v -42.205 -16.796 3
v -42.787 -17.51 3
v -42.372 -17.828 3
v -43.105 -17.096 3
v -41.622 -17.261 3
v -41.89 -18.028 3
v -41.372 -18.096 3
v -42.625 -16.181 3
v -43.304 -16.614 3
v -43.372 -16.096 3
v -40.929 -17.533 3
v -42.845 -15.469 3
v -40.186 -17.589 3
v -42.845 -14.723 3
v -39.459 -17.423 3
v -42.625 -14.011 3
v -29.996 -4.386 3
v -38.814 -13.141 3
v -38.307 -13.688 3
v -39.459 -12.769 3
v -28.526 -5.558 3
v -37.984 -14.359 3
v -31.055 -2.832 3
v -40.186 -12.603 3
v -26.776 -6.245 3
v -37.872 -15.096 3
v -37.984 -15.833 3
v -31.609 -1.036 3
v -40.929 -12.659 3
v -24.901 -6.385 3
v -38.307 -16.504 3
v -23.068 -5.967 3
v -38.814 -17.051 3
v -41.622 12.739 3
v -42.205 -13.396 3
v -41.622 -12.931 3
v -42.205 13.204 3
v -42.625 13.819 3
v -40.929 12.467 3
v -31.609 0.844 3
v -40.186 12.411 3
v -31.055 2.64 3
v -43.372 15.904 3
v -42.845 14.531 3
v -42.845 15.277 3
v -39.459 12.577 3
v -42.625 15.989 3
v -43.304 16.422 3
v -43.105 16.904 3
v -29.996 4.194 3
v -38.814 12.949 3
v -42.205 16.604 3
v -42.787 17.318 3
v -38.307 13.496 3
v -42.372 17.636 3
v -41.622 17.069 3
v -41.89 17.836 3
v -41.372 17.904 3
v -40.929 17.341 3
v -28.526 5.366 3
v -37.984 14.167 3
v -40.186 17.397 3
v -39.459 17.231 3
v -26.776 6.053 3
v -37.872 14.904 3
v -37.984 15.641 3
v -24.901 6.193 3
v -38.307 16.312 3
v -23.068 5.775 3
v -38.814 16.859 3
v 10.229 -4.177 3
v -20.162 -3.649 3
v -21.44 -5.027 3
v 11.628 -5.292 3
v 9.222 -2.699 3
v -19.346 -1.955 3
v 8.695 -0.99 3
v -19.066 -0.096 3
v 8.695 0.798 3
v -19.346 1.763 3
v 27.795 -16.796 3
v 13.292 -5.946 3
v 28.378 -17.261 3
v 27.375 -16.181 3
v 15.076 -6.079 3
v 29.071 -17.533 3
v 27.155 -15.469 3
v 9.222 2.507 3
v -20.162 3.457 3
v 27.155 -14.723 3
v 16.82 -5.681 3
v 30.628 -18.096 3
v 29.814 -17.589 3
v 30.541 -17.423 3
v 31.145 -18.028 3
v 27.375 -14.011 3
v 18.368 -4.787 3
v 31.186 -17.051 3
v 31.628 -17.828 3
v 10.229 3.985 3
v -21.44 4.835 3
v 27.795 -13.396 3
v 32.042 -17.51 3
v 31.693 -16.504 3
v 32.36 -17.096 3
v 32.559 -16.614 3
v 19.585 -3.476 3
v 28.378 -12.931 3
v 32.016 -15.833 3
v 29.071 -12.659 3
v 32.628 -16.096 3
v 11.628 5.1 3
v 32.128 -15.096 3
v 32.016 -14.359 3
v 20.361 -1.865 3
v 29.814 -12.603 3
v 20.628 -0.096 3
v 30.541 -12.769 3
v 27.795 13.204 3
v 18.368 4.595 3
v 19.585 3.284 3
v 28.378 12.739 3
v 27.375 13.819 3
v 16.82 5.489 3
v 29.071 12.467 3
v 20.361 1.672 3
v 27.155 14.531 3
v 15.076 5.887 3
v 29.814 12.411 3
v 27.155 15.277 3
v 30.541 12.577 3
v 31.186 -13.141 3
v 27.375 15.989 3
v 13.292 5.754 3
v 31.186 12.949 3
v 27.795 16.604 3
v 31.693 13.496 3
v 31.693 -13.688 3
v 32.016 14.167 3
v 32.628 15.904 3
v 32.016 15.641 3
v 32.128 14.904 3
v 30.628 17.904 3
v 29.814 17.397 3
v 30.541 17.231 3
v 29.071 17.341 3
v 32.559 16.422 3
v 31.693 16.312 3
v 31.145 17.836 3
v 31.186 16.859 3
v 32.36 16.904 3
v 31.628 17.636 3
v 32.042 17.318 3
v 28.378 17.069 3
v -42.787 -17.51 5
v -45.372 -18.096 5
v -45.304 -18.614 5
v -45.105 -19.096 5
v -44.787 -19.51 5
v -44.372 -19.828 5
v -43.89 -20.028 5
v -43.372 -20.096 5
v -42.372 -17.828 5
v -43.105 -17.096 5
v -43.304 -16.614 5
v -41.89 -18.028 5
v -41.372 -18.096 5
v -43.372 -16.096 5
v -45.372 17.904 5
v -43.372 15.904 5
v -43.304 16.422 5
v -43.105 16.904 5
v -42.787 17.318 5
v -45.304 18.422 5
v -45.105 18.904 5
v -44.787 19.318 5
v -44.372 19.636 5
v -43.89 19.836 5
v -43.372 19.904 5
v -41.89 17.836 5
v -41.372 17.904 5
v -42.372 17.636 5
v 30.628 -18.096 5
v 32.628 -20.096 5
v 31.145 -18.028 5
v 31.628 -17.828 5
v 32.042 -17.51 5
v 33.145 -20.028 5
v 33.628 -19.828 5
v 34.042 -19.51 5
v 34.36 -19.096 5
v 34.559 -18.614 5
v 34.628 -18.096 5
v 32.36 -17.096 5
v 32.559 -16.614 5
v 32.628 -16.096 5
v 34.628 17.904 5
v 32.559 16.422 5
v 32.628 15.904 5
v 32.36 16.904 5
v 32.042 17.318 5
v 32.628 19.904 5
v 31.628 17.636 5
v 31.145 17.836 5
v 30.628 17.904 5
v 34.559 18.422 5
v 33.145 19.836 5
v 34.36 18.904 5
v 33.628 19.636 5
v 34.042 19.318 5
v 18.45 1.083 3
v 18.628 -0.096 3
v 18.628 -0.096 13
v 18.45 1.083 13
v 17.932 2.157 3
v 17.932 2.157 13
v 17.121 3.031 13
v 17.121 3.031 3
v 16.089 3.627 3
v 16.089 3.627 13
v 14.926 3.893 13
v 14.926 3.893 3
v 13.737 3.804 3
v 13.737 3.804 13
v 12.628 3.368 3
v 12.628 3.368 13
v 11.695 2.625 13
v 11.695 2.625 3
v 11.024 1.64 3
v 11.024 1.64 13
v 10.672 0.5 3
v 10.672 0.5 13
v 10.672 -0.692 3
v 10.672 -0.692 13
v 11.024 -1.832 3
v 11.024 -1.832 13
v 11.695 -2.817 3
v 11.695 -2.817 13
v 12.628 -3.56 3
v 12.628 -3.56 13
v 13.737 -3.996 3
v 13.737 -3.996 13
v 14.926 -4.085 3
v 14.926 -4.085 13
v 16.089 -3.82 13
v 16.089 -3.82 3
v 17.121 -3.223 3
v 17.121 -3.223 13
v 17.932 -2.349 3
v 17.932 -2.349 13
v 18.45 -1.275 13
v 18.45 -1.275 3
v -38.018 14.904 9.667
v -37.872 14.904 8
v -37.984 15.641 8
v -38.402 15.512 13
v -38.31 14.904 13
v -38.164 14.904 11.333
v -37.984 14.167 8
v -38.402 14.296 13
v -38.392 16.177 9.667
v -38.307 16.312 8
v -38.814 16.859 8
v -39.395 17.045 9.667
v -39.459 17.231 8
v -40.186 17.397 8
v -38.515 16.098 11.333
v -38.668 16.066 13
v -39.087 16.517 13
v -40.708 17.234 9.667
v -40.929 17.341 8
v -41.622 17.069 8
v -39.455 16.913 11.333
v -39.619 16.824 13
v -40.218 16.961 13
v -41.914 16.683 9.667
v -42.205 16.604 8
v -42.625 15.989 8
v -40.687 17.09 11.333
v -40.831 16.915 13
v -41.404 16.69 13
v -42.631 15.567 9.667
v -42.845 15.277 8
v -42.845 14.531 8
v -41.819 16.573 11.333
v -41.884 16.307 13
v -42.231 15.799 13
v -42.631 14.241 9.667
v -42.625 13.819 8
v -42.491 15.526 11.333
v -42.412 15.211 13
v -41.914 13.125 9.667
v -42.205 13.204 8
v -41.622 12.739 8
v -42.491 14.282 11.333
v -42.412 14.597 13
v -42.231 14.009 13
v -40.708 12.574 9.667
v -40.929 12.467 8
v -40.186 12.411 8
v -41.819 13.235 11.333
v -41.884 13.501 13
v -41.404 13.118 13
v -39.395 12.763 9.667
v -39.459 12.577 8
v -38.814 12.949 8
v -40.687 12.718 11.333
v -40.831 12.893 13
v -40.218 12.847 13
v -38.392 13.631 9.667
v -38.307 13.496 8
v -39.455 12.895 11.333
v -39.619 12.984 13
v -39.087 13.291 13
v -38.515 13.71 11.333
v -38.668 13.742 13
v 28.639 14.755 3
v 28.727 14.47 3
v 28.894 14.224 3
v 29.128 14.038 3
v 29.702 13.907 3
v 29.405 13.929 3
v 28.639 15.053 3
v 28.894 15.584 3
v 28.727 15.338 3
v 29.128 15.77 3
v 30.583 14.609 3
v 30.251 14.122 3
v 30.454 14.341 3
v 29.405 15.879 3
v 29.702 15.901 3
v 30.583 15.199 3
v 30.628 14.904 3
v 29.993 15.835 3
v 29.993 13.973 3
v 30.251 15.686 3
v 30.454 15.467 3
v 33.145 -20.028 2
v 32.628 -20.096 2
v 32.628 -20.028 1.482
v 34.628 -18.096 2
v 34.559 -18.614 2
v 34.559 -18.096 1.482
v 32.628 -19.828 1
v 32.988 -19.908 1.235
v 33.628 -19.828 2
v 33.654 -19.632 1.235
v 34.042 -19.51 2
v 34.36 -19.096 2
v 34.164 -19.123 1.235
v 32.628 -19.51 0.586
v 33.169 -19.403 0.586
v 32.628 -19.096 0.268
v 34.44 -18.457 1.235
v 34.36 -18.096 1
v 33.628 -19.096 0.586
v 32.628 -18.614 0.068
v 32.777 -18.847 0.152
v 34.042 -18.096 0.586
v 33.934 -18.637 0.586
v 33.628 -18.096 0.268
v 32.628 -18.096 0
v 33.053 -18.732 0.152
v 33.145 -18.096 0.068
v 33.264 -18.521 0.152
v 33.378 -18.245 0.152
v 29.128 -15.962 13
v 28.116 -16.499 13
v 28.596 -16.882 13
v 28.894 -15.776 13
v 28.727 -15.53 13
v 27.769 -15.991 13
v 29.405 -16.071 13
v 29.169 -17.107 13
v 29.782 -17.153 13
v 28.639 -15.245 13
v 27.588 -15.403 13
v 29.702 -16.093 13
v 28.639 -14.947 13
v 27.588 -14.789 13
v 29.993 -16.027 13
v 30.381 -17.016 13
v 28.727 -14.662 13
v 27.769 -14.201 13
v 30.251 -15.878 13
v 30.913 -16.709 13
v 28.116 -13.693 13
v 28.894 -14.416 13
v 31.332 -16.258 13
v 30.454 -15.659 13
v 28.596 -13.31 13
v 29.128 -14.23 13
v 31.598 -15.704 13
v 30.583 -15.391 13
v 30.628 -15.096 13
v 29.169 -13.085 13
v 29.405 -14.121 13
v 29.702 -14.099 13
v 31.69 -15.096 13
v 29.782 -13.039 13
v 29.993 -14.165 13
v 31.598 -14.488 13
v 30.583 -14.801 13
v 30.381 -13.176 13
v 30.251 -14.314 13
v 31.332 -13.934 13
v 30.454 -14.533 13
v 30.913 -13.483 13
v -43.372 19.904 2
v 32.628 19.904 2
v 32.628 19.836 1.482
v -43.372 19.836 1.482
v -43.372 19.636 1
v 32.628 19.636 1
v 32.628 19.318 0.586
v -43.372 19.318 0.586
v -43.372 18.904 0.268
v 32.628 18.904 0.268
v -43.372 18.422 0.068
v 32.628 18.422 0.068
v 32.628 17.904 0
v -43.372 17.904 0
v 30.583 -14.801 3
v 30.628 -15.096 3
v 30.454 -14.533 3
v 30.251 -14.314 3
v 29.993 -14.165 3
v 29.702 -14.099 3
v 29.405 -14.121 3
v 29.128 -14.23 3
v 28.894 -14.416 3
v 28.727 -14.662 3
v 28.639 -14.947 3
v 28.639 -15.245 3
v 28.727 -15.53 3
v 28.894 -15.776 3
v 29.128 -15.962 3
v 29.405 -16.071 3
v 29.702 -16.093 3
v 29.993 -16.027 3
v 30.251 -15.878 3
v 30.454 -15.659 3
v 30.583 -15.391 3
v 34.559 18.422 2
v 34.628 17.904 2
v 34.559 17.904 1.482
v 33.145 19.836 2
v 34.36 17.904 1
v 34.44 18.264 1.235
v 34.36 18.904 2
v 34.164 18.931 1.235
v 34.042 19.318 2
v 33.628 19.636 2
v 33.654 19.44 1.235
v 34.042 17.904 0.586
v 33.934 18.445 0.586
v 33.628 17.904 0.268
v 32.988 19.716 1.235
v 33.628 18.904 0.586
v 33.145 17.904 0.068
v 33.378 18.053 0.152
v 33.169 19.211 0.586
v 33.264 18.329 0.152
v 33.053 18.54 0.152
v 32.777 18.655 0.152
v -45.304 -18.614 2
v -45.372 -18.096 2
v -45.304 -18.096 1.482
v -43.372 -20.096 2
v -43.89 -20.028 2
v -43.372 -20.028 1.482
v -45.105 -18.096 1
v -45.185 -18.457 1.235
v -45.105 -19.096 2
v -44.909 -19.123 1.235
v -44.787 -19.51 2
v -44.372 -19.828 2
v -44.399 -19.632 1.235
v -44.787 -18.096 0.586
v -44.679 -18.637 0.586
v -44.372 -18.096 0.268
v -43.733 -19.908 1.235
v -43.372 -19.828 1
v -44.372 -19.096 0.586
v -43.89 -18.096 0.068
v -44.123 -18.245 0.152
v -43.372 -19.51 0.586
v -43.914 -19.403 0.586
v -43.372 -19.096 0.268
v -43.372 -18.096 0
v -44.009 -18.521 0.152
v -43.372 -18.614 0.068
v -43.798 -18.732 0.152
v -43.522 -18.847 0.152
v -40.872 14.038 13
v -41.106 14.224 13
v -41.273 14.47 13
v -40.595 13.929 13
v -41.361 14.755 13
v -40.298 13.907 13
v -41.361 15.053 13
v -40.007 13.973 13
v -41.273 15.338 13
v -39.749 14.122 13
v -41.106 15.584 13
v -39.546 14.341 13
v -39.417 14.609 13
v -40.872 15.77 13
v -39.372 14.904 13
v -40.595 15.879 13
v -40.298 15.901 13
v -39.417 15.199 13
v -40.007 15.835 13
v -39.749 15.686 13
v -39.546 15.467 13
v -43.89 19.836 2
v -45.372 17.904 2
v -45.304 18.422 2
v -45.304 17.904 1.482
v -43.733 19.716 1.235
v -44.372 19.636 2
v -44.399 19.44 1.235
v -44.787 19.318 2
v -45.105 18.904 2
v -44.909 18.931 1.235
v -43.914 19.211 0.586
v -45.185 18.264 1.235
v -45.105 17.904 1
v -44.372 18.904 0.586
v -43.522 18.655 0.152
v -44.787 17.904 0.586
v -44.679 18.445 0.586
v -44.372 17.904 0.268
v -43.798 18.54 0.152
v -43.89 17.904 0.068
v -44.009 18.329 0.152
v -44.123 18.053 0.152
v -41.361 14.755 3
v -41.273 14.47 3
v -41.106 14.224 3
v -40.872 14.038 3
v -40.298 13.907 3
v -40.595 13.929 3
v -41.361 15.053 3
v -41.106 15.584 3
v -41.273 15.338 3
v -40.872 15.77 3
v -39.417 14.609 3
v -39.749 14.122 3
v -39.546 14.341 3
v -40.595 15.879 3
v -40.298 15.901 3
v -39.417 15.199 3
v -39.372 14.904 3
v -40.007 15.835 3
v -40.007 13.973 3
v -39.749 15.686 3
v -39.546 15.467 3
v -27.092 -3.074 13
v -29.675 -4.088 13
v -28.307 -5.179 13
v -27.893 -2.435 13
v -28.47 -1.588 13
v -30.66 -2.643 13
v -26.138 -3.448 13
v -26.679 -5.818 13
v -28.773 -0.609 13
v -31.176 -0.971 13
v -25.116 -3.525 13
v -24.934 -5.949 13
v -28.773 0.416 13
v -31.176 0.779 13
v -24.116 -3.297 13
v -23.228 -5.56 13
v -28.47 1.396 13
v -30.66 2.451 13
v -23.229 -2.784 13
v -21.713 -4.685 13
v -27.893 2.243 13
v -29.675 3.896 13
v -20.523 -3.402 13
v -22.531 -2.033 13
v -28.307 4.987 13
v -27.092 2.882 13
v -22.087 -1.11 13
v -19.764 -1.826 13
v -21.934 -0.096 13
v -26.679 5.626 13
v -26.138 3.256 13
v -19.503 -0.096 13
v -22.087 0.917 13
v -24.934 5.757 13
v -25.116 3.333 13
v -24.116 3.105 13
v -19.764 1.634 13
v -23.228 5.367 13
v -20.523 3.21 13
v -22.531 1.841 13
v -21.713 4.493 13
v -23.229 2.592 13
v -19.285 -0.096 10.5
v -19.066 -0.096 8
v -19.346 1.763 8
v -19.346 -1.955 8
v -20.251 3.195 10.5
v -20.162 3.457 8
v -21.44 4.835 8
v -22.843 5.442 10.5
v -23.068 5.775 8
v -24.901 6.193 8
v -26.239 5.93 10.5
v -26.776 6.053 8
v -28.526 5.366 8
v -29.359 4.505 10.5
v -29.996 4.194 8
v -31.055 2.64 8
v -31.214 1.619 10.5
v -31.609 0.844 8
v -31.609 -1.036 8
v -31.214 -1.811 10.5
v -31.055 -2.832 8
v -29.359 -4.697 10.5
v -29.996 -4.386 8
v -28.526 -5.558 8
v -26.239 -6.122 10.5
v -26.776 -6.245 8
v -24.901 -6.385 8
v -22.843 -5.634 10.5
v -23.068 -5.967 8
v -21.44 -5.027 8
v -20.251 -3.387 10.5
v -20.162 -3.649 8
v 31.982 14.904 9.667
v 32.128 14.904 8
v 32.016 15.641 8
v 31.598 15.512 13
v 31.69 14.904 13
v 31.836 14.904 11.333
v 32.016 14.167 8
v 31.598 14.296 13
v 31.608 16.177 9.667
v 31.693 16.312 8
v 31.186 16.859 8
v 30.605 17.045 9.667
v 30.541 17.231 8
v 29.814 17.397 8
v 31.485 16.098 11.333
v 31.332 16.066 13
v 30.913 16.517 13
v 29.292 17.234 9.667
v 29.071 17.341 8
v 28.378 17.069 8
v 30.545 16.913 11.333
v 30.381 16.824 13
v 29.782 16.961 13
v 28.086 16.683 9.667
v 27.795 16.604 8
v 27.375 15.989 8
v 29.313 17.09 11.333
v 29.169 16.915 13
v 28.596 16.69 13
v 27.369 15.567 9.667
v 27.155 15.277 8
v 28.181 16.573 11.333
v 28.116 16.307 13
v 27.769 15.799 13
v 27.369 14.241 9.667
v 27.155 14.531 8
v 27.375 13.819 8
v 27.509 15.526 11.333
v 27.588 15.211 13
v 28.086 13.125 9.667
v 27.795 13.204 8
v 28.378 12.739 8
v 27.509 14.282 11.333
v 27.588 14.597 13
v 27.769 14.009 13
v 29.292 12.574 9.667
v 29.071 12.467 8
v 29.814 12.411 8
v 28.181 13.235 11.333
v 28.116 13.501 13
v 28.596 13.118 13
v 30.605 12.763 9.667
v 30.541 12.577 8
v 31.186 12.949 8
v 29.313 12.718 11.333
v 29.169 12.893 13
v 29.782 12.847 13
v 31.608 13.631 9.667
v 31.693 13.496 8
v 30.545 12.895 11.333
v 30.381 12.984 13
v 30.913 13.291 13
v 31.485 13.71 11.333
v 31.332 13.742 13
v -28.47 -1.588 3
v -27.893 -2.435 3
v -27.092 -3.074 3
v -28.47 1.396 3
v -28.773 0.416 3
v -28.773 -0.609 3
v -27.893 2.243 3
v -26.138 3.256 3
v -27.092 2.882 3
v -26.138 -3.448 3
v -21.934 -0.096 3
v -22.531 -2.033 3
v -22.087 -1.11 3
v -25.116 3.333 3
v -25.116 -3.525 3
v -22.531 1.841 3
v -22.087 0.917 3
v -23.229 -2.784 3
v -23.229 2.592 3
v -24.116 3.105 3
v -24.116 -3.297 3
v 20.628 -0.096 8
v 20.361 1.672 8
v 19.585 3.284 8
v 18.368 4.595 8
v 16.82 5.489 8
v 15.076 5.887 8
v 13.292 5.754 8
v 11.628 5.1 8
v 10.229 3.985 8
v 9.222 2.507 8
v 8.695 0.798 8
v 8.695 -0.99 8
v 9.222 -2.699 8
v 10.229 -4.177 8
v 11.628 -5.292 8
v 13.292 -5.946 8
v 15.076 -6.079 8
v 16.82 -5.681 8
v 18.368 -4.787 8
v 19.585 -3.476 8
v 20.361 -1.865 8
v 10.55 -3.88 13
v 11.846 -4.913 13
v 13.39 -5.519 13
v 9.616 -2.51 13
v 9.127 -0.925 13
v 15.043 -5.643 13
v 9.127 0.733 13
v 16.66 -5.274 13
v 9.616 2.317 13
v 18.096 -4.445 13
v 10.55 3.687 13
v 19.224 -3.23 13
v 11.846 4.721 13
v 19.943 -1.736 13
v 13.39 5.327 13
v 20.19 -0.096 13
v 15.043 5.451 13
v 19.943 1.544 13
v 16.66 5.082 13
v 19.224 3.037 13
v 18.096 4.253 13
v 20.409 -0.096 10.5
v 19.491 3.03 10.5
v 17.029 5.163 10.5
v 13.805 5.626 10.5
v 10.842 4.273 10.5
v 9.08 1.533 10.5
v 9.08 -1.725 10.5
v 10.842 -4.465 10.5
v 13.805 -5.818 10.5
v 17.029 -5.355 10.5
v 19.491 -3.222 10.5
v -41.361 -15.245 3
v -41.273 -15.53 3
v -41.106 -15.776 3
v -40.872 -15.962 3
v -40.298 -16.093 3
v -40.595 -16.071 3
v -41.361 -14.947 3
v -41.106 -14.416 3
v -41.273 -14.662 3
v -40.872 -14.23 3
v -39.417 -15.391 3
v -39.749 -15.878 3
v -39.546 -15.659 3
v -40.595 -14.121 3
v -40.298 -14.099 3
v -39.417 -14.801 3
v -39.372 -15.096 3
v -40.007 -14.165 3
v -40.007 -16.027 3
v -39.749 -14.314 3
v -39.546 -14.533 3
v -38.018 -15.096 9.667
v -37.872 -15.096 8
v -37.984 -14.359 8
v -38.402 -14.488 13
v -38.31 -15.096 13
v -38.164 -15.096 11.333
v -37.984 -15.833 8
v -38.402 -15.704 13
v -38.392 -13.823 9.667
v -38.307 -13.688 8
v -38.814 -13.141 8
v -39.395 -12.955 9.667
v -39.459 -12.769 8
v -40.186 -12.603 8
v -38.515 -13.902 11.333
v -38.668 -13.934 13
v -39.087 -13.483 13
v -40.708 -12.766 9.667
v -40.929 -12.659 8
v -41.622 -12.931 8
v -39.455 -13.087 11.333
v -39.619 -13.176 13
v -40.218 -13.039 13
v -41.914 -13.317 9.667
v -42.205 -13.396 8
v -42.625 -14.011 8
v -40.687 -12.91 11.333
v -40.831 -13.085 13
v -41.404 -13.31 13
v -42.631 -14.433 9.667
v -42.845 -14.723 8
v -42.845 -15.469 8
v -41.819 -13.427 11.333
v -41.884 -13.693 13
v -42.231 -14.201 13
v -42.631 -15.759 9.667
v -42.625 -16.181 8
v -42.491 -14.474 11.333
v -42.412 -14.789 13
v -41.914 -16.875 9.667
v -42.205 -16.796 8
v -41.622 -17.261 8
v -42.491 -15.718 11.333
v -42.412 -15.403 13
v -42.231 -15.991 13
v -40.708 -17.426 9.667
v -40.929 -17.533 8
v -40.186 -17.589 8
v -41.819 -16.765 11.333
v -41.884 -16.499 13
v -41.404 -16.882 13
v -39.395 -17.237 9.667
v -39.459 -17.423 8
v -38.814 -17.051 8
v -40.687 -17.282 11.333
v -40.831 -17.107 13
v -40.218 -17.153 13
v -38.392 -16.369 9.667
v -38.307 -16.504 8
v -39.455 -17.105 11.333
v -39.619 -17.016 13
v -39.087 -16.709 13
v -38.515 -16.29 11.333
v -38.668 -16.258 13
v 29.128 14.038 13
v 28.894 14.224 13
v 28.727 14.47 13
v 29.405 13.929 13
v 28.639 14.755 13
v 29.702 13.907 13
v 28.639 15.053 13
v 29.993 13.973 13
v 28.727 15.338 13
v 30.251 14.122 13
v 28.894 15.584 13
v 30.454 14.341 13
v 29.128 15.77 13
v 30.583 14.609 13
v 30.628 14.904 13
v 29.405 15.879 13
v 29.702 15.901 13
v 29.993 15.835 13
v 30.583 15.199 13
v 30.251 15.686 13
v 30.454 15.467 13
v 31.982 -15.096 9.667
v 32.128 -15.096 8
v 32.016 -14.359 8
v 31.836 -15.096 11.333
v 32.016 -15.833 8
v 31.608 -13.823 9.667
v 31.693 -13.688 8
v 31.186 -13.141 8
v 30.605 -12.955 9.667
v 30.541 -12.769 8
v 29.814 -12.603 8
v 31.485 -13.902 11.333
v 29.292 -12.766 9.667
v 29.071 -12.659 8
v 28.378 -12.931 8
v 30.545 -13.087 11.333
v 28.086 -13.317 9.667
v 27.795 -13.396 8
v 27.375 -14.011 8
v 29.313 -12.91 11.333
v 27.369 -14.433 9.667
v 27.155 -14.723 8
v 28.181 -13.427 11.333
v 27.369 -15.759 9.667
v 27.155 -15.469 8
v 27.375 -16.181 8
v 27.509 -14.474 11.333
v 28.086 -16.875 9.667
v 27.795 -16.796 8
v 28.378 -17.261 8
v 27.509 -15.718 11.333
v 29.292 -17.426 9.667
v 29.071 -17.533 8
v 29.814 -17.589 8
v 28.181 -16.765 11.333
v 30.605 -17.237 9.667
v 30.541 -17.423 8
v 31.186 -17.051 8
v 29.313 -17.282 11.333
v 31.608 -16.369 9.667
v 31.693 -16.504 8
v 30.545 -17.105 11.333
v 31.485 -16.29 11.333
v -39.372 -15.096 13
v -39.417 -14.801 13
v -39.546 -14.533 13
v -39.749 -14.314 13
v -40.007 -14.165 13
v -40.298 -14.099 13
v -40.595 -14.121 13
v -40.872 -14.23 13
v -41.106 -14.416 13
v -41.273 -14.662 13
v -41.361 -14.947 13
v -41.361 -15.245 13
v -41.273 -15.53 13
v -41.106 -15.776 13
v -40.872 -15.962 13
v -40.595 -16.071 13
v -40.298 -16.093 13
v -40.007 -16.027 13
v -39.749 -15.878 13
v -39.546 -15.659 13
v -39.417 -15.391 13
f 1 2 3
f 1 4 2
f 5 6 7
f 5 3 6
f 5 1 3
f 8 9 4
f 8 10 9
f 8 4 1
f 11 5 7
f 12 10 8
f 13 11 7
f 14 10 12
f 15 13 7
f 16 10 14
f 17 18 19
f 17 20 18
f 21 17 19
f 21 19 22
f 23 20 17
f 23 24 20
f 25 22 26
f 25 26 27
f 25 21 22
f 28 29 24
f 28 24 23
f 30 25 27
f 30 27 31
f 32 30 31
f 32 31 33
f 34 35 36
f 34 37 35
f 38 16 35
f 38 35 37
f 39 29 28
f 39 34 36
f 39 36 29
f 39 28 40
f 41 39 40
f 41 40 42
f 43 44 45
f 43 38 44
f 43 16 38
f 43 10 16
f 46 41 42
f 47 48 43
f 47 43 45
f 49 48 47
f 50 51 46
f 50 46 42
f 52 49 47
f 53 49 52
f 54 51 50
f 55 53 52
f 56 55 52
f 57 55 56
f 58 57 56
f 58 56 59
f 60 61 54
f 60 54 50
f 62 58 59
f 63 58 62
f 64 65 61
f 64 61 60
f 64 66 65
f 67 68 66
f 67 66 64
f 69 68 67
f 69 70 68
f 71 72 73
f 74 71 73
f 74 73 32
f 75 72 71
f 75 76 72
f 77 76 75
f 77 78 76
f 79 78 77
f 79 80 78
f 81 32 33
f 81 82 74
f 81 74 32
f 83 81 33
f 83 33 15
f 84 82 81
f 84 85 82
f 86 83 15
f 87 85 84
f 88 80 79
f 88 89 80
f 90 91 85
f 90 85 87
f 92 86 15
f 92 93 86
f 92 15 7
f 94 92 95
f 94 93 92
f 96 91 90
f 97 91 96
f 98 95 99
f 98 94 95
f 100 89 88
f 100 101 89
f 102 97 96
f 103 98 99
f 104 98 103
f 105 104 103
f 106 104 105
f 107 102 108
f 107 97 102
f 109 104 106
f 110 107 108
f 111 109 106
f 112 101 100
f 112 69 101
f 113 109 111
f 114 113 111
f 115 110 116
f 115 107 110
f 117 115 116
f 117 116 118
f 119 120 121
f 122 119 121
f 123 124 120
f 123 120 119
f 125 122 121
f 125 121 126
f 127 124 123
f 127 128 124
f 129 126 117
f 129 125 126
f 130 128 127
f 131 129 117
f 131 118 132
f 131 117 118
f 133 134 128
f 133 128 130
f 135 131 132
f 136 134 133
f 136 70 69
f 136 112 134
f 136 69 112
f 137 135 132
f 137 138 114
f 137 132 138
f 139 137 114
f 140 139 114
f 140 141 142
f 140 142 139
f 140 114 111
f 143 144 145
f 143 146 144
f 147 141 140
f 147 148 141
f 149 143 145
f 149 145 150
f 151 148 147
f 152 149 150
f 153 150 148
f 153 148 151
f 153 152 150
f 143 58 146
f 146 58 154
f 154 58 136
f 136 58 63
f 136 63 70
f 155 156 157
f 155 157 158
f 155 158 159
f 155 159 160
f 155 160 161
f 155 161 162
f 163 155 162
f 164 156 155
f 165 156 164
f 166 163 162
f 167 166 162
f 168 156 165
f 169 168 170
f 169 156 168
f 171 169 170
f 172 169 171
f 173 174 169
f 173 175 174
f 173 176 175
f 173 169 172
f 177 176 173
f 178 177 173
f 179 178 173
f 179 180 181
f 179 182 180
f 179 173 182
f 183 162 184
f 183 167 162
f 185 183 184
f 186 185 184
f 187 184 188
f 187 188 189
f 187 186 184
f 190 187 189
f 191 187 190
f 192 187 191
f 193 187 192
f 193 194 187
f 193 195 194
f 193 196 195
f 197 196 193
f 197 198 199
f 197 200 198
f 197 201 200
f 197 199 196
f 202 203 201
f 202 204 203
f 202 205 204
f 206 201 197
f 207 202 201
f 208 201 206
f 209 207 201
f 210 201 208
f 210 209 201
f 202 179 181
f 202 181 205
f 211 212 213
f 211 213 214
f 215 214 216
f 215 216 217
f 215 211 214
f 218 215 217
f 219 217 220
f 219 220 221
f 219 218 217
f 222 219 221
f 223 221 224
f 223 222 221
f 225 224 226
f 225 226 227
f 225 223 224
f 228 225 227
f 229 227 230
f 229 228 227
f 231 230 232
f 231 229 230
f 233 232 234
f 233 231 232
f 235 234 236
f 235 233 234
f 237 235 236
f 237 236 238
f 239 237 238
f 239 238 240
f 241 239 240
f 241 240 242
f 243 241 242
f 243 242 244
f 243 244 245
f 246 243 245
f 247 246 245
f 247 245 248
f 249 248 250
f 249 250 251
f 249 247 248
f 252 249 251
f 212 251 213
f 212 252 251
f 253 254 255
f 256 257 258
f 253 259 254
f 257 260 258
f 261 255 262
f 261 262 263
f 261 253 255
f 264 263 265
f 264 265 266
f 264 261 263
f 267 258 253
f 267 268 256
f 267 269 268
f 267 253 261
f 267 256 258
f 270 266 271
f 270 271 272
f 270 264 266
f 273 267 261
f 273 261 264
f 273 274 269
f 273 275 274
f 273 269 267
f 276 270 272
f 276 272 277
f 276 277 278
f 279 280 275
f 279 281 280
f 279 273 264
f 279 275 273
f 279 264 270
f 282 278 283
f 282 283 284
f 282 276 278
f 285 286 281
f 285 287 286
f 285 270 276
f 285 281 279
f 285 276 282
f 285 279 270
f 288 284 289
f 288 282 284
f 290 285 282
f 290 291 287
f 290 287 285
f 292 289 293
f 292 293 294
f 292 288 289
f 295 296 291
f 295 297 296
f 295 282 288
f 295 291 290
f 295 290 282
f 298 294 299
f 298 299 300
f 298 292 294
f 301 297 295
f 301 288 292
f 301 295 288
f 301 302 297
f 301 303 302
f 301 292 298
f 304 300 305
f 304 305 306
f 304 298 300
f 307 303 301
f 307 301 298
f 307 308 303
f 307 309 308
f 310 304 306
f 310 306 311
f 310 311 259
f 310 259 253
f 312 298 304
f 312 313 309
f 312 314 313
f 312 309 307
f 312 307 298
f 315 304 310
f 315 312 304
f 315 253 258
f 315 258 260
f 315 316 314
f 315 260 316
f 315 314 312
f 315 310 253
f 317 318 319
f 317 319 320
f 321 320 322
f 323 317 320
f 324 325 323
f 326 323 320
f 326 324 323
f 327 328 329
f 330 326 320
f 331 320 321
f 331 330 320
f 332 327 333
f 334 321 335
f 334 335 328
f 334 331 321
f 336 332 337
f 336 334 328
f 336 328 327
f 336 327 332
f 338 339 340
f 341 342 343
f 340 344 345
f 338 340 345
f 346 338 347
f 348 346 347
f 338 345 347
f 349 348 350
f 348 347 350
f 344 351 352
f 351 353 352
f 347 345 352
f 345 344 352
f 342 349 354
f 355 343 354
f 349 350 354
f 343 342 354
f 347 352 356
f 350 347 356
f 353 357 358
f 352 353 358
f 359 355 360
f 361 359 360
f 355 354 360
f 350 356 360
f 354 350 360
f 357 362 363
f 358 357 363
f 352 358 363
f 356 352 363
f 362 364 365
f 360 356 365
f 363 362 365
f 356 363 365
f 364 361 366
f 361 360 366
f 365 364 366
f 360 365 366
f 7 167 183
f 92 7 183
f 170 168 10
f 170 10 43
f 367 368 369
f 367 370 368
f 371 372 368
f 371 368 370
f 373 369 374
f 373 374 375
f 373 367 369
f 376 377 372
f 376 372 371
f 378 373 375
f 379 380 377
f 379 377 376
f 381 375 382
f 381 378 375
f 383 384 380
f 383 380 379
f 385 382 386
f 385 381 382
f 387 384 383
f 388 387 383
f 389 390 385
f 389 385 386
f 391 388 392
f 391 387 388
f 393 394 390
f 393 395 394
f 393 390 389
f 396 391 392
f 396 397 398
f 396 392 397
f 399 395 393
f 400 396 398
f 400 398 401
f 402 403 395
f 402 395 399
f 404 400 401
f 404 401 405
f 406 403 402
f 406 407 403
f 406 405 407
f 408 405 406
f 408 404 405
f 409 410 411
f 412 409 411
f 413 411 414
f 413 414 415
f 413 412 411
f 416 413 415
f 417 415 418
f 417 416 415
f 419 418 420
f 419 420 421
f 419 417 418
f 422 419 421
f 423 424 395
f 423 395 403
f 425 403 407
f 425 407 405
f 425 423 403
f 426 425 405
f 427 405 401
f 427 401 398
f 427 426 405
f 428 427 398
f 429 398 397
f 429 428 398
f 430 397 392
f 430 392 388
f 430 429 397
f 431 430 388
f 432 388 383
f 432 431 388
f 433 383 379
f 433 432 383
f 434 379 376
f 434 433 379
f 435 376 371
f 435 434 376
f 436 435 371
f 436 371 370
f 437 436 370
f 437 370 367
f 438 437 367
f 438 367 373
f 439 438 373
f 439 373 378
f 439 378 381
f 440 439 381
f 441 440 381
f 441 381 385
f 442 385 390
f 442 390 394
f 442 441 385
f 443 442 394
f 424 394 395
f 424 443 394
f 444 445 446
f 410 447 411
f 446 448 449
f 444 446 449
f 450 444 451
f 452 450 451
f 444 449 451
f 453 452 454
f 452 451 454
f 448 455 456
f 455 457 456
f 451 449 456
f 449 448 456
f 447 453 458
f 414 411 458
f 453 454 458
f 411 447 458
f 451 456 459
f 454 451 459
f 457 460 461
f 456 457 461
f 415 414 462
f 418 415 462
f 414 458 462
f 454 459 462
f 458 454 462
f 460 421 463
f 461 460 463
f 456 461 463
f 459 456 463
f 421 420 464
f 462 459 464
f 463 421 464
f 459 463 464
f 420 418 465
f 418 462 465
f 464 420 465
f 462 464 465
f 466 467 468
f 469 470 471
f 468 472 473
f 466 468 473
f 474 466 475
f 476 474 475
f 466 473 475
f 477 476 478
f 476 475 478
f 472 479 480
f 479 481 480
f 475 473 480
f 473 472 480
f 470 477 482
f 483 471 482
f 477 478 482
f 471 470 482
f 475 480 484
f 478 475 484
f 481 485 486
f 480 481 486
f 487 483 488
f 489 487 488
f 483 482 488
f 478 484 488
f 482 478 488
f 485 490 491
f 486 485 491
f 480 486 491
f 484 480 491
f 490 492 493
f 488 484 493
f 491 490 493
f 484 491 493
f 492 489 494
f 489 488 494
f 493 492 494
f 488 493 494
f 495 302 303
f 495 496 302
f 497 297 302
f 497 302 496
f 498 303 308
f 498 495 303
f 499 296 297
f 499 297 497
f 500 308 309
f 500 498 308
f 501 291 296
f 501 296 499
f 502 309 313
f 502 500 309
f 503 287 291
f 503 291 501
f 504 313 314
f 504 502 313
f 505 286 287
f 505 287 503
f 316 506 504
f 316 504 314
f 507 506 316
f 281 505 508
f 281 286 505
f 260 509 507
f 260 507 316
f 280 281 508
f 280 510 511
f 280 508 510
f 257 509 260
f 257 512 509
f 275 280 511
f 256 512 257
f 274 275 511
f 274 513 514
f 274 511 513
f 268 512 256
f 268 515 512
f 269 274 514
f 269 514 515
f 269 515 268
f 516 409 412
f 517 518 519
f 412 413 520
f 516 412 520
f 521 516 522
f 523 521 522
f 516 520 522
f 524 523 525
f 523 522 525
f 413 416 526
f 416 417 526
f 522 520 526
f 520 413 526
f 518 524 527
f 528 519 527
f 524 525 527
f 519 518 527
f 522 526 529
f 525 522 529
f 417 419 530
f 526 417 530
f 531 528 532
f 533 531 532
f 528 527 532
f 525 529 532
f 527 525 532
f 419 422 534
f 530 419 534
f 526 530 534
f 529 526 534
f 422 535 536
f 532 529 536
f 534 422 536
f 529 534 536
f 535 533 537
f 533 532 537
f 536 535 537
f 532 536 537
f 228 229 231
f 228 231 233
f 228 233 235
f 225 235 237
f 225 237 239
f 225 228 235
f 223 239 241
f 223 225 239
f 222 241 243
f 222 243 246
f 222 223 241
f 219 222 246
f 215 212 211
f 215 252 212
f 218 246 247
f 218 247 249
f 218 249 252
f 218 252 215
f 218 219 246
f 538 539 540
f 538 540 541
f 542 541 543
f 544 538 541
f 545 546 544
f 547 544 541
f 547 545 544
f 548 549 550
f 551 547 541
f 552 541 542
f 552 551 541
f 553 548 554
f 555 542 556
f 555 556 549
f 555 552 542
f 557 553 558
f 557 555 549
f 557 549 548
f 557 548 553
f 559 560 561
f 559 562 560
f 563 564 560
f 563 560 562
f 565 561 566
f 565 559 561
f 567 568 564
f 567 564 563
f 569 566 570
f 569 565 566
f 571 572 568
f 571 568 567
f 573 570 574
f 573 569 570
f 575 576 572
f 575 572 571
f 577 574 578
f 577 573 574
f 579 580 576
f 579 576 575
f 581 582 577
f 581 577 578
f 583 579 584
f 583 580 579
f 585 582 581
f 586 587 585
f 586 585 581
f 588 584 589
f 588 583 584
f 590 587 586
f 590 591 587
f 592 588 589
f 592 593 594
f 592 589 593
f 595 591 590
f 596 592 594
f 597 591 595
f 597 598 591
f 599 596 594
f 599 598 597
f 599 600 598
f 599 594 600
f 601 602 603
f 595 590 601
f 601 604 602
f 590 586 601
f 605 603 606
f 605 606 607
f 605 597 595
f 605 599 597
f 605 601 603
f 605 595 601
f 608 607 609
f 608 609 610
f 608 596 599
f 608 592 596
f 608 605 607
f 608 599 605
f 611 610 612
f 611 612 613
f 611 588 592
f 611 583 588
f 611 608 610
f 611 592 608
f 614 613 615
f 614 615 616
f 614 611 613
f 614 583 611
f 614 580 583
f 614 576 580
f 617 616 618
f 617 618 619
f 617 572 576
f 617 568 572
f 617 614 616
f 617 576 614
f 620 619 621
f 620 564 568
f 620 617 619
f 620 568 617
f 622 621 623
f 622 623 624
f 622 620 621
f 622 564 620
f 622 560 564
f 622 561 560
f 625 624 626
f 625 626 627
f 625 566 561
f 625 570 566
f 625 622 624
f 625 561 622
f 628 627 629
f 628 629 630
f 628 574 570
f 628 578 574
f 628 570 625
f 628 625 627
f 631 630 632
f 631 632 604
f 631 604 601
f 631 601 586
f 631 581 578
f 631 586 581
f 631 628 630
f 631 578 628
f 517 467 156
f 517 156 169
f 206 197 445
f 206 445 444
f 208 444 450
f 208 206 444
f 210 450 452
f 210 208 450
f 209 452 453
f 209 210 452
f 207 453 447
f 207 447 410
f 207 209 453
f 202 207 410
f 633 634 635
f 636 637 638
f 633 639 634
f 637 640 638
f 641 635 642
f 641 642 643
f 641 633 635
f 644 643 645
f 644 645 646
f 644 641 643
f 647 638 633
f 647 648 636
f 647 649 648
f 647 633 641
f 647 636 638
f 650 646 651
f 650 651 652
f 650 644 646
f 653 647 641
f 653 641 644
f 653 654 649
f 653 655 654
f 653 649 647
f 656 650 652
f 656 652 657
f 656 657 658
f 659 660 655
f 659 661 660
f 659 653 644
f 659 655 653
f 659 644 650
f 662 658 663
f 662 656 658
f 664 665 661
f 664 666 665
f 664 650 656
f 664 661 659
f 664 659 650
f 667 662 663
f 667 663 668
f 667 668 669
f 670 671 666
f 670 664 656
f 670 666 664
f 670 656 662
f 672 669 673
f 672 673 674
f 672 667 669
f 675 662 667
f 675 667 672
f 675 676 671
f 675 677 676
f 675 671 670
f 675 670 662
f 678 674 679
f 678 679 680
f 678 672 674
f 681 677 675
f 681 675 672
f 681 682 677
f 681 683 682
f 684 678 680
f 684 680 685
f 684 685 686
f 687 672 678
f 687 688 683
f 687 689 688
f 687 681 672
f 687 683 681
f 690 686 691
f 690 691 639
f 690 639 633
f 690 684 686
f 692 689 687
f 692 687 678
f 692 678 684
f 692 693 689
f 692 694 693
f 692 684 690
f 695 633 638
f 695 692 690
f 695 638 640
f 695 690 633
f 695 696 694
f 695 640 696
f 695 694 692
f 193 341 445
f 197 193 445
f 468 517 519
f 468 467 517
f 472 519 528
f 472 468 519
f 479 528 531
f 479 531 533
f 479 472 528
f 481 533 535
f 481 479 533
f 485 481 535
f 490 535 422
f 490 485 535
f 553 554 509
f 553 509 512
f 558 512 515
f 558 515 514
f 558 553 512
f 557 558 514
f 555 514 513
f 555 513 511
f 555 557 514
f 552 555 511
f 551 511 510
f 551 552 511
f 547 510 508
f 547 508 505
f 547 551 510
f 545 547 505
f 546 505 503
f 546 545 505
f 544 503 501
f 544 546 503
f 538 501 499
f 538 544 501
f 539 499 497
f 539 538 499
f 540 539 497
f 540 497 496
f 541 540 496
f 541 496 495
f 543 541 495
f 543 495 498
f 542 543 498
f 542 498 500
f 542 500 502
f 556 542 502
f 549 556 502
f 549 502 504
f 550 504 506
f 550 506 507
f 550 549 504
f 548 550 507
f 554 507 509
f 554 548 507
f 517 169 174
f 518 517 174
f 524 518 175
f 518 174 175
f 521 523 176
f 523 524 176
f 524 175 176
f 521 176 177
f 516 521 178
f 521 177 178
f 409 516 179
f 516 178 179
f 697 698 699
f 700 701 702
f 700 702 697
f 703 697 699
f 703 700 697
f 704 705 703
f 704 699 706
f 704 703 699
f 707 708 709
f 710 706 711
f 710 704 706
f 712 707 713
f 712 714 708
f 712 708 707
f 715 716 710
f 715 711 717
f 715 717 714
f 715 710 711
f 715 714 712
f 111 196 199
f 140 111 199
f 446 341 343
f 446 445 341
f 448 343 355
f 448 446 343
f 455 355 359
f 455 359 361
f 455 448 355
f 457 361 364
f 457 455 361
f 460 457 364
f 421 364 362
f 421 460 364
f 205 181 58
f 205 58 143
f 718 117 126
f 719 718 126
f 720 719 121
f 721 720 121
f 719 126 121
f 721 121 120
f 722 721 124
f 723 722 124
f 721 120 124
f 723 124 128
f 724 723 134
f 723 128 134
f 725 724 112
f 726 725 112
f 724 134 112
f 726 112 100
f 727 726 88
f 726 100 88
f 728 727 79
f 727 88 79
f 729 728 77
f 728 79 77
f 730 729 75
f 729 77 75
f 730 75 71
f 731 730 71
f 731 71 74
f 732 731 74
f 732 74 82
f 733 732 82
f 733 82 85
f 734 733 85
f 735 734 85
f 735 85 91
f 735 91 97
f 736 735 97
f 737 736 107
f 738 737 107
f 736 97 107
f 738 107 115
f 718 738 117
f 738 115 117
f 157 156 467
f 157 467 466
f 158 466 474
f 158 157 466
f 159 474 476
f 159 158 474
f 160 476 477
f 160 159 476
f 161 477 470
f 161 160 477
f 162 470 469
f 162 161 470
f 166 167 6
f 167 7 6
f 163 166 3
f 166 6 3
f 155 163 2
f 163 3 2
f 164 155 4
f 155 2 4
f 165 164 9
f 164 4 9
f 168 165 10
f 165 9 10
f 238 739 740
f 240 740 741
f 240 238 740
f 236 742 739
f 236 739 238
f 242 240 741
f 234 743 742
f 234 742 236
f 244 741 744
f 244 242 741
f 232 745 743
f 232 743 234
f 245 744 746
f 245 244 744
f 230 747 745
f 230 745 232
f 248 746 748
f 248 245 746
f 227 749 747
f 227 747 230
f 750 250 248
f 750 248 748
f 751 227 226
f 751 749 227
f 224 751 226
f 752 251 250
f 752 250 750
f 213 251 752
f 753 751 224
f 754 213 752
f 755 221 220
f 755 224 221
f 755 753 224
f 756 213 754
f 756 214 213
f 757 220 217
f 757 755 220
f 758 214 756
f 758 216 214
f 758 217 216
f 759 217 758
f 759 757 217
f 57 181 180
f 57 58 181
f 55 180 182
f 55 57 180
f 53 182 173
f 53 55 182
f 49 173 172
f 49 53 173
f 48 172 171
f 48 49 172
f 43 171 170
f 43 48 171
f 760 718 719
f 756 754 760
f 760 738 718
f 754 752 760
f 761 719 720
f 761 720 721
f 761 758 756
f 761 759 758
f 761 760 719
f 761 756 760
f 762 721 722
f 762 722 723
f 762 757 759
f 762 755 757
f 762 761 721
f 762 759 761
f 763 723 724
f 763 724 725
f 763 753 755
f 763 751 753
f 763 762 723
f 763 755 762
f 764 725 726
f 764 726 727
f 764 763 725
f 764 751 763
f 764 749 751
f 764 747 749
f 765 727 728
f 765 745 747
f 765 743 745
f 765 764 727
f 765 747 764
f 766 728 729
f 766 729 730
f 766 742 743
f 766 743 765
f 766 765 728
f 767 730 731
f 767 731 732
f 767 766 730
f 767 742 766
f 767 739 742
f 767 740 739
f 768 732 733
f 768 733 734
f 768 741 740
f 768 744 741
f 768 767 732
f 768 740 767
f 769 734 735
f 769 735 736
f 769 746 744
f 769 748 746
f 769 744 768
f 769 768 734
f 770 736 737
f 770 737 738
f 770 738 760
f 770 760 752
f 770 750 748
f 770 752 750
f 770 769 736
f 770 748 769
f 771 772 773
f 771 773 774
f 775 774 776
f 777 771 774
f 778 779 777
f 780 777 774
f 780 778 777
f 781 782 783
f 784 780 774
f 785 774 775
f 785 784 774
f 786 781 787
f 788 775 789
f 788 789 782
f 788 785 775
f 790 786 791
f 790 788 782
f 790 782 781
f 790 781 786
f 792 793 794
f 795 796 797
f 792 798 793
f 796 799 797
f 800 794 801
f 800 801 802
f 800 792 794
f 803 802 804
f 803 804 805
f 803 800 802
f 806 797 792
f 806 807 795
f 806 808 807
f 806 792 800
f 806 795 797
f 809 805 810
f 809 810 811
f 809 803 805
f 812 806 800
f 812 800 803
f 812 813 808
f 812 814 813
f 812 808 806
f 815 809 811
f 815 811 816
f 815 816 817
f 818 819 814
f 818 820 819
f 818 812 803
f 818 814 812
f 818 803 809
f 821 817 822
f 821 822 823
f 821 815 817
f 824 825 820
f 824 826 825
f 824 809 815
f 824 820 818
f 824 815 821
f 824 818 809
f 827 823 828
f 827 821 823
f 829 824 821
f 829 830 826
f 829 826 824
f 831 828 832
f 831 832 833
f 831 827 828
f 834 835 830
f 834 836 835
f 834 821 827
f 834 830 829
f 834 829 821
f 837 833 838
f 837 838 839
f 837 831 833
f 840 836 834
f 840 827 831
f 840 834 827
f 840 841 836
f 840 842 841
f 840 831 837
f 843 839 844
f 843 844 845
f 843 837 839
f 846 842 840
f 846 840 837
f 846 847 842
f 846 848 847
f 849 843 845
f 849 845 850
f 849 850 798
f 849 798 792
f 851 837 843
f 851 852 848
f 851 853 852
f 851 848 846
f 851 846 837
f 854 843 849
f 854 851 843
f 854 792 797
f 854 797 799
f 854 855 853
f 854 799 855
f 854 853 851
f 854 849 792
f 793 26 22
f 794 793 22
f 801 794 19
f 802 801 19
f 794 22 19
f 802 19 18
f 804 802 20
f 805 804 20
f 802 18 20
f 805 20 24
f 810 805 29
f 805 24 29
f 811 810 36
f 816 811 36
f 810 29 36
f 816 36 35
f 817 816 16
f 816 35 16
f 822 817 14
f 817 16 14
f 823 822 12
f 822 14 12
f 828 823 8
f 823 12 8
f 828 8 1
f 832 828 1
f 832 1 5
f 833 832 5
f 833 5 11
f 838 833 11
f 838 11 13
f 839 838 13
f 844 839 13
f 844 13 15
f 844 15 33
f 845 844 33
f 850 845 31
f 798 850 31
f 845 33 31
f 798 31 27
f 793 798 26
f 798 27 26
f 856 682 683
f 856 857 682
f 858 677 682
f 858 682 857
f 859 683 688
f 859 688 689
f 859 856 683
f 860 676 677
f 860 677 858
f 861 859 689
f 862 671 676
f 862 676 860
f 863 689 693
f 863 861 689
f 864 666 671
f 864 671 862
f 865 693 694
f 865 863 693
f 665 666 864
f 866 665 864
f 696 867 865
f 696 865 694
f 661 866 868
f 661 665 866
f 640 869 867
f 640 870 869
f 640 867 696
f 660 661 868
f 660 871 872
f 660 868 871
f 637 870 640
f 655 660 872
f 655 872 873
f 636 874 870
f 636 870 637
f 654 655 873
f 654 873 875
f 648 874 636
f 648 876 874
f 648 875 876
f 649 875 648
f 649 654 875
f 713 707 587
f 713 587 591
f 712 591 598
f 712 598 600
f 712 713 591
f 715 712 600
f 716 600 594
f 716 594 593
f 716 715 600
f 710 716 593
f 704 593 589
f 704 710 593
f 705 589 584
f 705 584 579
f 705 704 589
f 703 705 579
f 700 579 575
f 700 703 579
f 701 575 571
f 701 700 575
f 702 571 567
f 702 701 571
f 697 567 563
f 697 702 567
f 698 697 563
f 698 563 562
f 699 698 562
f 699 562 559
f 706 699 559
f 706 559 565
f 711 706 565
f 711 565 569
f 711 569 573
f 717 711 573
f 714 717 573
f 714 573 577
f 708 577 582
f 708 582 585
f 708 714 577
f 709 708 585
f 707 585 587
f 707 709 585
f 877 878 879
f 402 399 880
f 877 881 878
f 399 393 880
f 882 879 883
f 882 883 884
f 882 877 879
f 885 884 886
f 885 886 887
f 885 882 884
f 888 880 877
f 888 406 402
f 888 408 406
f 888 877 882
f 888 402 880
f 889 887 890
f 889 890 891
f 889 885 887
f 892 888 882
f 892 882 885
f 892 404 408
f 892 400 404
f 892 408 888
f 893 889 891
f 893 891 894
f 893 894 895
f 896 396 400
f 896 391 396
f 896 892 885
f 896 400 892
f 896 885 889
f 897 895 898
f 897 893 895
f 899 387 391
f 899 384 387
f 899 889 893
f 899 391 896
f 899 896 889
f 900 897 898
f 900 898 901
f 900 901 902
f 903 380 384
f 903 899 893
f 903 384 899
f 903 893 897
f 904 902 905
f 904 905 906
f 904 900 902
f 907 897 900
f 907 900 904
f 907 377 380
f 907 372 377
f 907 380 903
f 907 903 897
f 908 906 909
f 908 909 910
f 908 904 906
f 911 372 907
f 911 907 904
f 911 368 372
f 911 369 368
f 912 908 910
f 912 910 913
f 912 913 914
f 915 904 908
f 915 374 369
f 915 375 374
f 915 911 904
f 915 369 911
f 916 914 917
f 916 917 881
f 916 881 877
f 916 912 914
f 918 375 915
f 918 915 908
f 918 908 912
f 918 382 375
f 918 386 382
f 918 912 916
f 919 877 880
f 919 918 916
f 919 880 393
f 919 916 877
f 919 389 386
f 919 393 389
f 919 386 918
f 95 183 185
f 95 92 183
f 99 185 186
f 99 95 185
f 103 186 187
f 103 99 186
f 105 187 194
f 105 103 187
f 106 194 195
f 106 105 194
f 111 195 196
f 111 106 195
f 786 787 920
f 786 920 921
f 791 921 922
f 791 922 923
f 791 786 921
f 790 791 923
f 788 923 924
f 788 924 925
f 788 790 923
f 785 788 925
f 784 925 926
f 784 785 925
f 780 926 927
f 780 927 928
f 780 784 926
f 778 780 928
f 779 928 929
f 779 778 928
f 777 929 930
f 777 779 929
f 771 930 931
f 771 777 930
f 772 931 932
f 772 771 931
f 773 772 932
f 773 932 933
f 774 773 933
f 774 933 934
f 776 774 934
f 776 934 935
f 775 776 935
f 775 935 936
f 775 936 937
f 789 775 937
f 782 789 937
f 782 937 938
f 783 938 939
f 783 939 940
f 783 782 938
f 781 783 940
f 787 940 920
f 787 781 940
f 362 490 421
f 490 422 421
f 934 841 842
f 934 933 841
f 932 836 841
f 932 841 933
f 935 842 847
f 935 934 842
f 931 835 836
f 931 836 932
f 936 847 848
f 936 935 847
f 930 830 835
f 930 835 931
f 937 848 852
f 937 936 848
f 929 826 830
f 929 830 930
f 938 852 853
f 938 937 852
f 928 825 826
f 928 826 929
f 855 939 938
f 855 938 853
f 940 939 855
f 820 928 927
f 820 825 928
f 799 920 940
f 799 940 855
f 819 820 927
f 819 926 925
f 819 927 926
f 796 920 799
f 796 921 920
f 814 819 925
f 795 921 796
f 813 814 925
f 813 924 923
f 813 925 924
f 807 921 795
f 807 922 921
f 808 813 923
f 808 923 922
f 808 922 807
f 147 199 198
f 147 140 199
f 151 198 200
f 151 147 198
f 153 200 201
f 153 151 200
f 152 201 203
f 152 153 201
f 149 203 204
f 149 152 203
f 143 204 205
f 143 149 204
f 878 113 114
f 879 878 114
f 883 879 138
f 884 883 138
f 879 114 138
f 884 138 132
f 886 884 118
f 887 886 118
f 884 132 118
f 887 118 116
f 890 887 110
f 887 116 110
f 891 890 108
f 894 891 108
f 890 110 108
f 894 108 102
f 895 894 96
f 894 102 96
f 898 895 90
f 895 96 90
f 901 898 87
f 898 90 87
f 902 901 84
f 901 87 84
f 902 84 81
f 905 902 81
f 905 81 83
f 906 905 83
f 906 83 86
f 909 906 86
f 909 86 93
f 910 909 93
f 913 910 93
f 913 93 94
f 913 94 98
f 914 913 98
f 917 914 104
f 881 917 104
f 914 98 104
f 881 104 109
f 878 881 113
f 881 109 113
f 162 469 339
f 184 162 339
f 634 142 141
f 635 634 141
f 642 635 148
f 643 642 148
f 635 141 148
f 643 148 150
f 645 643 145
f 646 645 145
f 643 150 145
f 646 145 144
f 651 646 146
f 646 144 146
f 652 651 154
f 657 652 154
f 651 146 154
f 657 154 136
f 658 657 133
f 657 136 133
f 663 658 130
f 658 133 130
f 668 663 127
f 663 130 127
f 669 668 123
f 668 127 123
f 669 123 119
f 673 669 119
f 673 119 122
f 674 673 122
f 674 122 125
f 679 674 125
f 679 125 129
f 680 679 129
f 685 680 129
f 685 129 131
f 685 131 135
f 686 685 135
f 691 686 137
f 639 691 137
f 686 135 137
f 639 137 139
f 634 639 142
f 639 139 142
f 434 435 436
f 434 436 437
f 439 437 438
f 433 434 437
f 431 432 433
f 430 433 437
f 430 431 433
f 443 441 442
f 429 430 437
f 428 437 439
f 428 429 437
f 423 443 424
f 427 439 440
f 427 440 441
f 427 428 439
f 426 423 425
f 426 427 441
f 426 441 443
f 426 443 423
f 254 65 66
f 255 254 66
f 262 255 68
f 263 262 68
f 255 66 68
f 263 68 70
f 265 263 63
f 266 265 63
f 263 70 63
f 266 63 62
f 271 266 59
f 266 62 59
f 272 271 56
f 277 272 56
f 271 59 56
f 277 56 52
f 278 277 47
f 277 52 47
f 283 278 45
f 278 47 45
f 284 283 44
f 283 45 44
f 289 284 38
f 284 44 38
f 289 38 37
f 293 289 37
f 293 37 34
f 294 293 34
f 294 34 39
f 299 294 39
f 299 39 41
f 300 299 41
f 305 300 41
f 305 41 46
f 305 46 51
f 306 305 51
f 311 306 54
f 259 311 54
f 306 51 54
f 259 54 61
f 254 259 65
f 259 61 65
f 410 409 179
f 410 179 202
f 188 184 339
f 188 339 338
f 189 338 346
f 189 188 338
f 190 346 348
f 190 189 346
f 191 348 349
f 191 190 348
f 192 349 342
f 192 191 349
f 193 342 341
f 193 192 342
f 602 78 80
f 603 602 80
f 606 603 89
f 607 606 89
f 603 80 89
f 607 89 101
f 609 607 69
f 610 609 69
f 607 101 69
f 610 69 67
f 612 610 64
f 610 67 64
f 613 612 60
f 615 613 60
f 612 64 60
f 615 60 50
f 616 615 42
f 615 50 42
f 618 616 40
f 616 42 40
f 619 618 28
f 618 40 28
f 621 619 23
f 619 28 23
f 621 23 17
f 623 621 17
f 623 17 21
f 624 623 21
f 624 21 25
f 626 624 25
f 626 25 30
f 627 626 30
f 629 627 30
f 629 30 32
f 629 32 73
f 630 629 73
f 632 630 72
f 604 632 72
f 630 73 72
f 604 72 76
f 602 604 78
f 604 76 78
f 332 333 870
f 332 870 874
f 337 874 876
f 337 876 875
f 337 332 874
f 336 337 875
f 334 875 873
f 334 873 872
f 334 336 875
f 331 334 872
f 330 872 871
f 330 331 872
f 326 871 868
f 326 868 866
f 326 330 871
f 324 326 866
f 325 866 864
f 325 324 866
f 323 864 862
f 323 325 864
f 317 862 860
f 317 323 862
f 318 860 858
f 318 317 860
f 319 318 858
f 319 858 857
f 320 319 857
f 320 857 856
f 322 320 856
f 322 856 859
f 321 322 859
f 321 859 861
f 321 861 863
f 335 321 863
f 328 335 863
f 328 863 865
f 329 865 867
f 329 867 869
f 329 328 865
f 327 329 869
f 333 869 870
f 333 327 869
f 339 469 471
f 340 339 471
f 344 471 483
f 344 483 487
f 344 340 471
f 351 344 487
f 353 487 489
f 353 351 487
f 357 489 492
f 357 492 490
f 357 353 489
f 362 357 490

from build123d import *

# Parameters (mm, degrees)
SKETCH_1_W             = 80
SKETCH_1_H             = 40
EXTRUDE_1_DEPTH        = 5
FILLET_1_R             = 2
SKETCH_2_W             = 76
SKETCH_2_H             = 36
CUT_EXTRUDE_1_DEPTH    = 2
FILLET_2_R             = 2
FILLET_3_R             = 2
SKETCH_3_R             = 2.5
SKETCH_3_R_2           = 1
SKETCH_3_R_3           = 6
SKETCH_3_R_4           = 4
EXTRUDE_2_DEPTH        = 10
CHAMFER_1_SIZE         = 5
CHAMFER_1_SIZE2        = 0.437443318
SKETCH_4_R             = 6.306678775
SKETCH_4_R_2           = 3.438504878
EXTRUDE_3_DEPTH        = 10
CHAMFER_2_SIZE         = 5
CHAMFER_2_SIZE2        = 0.437443318
CHAMFER_4_SIZE         = 5
CHAMFER_4_SIZE2        = 0.437443318
CHAMFER_4_PART_2_SIZE  = 5
CHAMFER_4_PART_2_SIZE2 = 0.437443318
CHAMFER_4_PART_3_SIZE  = 5
CHAMFER_4_PART_3_SIZE2 = 0.437443318
CHAMFER_4_PART_4_SIZE  = 5
CHAMFER_4_PART_4_SIZE2 = 0.437443318


with BuildPart() as part:
    # 草图1 → 拉伸1 (new body)
    with BuildSketch(Plane.XY):
        with Locations((-5.372486772, -0.096031746)):
            Rectangle(SKETCH_1_W, SKETCH_1_H)
    extrude(amount=EXTRUDE_1_DEPTH)

    # 圆角1
    fillet_1_edges = [part.edges().sort_by_distance(p)[0] for p in [
        (-45.372486772, 19.903968254, 2.5),
        (34.627513228, 19.903968254, 2.5),
        (34.627513228, -20.096031746, 2.5),
        (-45.372486772, -20.096031746, 2.5),
    ]]
    fillet(fillet_1_edges, radius=FILLET_1_R)

    # 草图2 → 切除-拉伸1 (cut)
    with BuildSketch(Plane.XY.offset(5)):
        with Locations((-5.372486772, -0.096031746)):
            Rectangle(SKETCH_2_W, SKETCH_2_H)
    extrude(amount=-CUT_EXTRUDE_1_DEPTH, mode=Mode.SUBTRACT)

    # 圆角2
    fillet_2_edges = [part.edges().sort_by_distance(p)[0] for p in [
        (-43.372486772, -18.096031746, 4),
        (-43.372486772, 17.903968254, 4),
        (32.627513228, 17.903968254, 4),
        (32.627513228, -18.096031746, 4),
    ]]
    fillet(fillet_2_edges, radius=FILLET_2_R)

    # 圆角3
    fillet_3_edges = [part.edges().sort_by_distance(p)[0] for p in [
        (-5.372486772, -20.096031746, 0),
        (-45.372486772, -0.096031746, 0),
        (-5.372486772, 19.903968254, 0),
        (34.627513228, -0.096031746, 0),
        (-44.786700335, 19.318181816, 0),
        (34.04172679, 19.318181816, 0),
        (34.04172679, -19.510245308, 0),
        (-44.786700335, -19.510245308, 0),
    ]]
    fillet(fillet_3_edges, radius=FILLET_3_R)

    # 草图3 → 拉伸2 (add)
    with BuildSketch(Plane.XY.offset(3)):
        with Locations((-40.372486772, 14.903968254)):
            Circle(SKETCH_3_R)
        with Locations((-40.372486772, 14.903968254)):
            Circle(SKETCH_3_R_2, mode=Mode.SUBTRACT)
        with Locations((29.627513228, 14.903968254)):
            Circle(SKETCH_3_R)
        with Locations((29.627513228, 14.903968254)):
            Circle(SKETCH_3_R_2, mode=Mode.SUBTRACT)
        with Locations((29.627513228, -15.096031746)):
            Circle(SKETCH_3_R)
        with Locations((29.627513228, -15.096031746)):
            Circle(SKETCH_3_R_2, mode=Mode.SUBTRACT)
        with Locations((-40.372486772, -15.096031746)):
            Circle(SKETCH_3_R)
        with Locations((-40.372486772, -15.096031746)):
            Circle(SKETCH_3_R_2, mode=Mode.SUBTRACT)
        with Locations((14.627513228, -0.096031746)):
            Circle(SKETCH_3_R_3)
        with Locations((14.627513228, -0.096031746)):
            Circle(SKETCH_3_R_4, mode=Mode.SUBTRACT)
    extrude(amount=EXTRUDE_2_DEPTH)

    # 倒角1
    chamfer_1_edges = [part.edges().sort_by_distance(p)[0] for p in [
        (8.627513228, -0.096031746, 13),
    ]]
    chamfer_1_side = [part.faces().sort_by_distance(p)[0] for p in [
        (8.627513228, -0.096031746, 8),
    ]]
    chamfer(chamfer_1_edges, length=CHAMFER_1_SIZE, length2=CHAMFER_1_SIZE2, reference=chamfer_1_side[0])

    # 草图4 → 拉伸3 (add)
    with BuildSketch(Plane.XY.offset(3)):
        with Locations((-25.372486772, -0.096031746)):
            Circle(SKETCH_4_R)
        with Locations((-25.372486772, -0.096031746)):
            Circle(SKETCH_4_R_2, mode=Mode.SUBTRACT)
    extrude(amount=EXTRUDE_3_DEPTH)

    # 倒角2
    chamfer_2_edges = [part.edges().sort_by_distance(p)[0] for p in [
        (-31.679165547, -0.096031746, 13),
    ]]
    chamfer_2_side = [part.faces().sort_by_distance(p)[0] for p in [
        (-31.679165547, -0.096031746, 8),
    ]]
    chamfer(chamfer_2_edges, length=CHAMFER_2_SIZE, length2=CHAMFER_2_SIZE2, reference=chamfer_2_side[0])

    # 倒角4
    chamfer_4_edges = [part.edges().sort_by_distance(p)[0] for p in [
        (-42.872486772, 14.903968254, 13),
    ]]
    chamfer_4_side = [part.faces().sort_by_distance(p)[0] for p in [
        (-42.872486772, 14.903968254, 8),
    ]]
    chamfer(chamfer_4_edges, length=CHAMFER_4_SIZE, length2=CHAMFER_4_SIZE2, reference=chamfer_4_side[0])

    # 倒角4 part 2
    chamfer_4_part_2_edges = [part.edges().sort_by_distance(p)[0] for p in [
        (27.127513228, 14.903968254, 13),
    ]]
    chamfer_4_part_2_side = [part.faces().sort_by_distance(p)[0] for p in [
        (27.127513228, 14.903968254, 8),
    ]]
    chamfer(chamfer_4_part_2_edges, length=CHAMFER_4_PART_2_SIZE, length2=CHAMFER_4_PART_2_SIZE2, reference=chamfer_4_part_2_side[0])

    # 倒角4 part 3
    chamfer_4_part_3_edges = [part.edges().sort_by_distance(p)[0] for p in [
        (27.127513228, -15.096031746, 13),
    ]]
    chamfer_4_part_3_side = [part.faces().sort_by_distance(p)[0] for p in [
        (27.127513228, -15.096031746, 8),
    ]]
    chamfer(chamfer_4_part_3_edges, length=CHAMFER_4_PART_3_SIZE, length2=CHAMFER_4_PART_3_SIZE2, reference=chamfer_4_part_3_side[0])

    # 倒角4 part 4
    chamfer_4_part_4_edges = [part.edges().sort_by_distance(p)[0] for p in [
        (-42.872486772, -15.096031746, 13),
    ]]
    chamfer_4_part_4_side = [part.faces().sort_by_distance(p)[0] for p in [
        (-42.872486772, -15.096031746, 8),
    ]]
    chamfer(chamfer_4_part_4_edges, length=CHAMFER_4_PART_4_SIZE, length2=CHAMFER_4_PART_4_SIZE2, reference=chamfer_4_part_4_side[0])


solid = part.part
